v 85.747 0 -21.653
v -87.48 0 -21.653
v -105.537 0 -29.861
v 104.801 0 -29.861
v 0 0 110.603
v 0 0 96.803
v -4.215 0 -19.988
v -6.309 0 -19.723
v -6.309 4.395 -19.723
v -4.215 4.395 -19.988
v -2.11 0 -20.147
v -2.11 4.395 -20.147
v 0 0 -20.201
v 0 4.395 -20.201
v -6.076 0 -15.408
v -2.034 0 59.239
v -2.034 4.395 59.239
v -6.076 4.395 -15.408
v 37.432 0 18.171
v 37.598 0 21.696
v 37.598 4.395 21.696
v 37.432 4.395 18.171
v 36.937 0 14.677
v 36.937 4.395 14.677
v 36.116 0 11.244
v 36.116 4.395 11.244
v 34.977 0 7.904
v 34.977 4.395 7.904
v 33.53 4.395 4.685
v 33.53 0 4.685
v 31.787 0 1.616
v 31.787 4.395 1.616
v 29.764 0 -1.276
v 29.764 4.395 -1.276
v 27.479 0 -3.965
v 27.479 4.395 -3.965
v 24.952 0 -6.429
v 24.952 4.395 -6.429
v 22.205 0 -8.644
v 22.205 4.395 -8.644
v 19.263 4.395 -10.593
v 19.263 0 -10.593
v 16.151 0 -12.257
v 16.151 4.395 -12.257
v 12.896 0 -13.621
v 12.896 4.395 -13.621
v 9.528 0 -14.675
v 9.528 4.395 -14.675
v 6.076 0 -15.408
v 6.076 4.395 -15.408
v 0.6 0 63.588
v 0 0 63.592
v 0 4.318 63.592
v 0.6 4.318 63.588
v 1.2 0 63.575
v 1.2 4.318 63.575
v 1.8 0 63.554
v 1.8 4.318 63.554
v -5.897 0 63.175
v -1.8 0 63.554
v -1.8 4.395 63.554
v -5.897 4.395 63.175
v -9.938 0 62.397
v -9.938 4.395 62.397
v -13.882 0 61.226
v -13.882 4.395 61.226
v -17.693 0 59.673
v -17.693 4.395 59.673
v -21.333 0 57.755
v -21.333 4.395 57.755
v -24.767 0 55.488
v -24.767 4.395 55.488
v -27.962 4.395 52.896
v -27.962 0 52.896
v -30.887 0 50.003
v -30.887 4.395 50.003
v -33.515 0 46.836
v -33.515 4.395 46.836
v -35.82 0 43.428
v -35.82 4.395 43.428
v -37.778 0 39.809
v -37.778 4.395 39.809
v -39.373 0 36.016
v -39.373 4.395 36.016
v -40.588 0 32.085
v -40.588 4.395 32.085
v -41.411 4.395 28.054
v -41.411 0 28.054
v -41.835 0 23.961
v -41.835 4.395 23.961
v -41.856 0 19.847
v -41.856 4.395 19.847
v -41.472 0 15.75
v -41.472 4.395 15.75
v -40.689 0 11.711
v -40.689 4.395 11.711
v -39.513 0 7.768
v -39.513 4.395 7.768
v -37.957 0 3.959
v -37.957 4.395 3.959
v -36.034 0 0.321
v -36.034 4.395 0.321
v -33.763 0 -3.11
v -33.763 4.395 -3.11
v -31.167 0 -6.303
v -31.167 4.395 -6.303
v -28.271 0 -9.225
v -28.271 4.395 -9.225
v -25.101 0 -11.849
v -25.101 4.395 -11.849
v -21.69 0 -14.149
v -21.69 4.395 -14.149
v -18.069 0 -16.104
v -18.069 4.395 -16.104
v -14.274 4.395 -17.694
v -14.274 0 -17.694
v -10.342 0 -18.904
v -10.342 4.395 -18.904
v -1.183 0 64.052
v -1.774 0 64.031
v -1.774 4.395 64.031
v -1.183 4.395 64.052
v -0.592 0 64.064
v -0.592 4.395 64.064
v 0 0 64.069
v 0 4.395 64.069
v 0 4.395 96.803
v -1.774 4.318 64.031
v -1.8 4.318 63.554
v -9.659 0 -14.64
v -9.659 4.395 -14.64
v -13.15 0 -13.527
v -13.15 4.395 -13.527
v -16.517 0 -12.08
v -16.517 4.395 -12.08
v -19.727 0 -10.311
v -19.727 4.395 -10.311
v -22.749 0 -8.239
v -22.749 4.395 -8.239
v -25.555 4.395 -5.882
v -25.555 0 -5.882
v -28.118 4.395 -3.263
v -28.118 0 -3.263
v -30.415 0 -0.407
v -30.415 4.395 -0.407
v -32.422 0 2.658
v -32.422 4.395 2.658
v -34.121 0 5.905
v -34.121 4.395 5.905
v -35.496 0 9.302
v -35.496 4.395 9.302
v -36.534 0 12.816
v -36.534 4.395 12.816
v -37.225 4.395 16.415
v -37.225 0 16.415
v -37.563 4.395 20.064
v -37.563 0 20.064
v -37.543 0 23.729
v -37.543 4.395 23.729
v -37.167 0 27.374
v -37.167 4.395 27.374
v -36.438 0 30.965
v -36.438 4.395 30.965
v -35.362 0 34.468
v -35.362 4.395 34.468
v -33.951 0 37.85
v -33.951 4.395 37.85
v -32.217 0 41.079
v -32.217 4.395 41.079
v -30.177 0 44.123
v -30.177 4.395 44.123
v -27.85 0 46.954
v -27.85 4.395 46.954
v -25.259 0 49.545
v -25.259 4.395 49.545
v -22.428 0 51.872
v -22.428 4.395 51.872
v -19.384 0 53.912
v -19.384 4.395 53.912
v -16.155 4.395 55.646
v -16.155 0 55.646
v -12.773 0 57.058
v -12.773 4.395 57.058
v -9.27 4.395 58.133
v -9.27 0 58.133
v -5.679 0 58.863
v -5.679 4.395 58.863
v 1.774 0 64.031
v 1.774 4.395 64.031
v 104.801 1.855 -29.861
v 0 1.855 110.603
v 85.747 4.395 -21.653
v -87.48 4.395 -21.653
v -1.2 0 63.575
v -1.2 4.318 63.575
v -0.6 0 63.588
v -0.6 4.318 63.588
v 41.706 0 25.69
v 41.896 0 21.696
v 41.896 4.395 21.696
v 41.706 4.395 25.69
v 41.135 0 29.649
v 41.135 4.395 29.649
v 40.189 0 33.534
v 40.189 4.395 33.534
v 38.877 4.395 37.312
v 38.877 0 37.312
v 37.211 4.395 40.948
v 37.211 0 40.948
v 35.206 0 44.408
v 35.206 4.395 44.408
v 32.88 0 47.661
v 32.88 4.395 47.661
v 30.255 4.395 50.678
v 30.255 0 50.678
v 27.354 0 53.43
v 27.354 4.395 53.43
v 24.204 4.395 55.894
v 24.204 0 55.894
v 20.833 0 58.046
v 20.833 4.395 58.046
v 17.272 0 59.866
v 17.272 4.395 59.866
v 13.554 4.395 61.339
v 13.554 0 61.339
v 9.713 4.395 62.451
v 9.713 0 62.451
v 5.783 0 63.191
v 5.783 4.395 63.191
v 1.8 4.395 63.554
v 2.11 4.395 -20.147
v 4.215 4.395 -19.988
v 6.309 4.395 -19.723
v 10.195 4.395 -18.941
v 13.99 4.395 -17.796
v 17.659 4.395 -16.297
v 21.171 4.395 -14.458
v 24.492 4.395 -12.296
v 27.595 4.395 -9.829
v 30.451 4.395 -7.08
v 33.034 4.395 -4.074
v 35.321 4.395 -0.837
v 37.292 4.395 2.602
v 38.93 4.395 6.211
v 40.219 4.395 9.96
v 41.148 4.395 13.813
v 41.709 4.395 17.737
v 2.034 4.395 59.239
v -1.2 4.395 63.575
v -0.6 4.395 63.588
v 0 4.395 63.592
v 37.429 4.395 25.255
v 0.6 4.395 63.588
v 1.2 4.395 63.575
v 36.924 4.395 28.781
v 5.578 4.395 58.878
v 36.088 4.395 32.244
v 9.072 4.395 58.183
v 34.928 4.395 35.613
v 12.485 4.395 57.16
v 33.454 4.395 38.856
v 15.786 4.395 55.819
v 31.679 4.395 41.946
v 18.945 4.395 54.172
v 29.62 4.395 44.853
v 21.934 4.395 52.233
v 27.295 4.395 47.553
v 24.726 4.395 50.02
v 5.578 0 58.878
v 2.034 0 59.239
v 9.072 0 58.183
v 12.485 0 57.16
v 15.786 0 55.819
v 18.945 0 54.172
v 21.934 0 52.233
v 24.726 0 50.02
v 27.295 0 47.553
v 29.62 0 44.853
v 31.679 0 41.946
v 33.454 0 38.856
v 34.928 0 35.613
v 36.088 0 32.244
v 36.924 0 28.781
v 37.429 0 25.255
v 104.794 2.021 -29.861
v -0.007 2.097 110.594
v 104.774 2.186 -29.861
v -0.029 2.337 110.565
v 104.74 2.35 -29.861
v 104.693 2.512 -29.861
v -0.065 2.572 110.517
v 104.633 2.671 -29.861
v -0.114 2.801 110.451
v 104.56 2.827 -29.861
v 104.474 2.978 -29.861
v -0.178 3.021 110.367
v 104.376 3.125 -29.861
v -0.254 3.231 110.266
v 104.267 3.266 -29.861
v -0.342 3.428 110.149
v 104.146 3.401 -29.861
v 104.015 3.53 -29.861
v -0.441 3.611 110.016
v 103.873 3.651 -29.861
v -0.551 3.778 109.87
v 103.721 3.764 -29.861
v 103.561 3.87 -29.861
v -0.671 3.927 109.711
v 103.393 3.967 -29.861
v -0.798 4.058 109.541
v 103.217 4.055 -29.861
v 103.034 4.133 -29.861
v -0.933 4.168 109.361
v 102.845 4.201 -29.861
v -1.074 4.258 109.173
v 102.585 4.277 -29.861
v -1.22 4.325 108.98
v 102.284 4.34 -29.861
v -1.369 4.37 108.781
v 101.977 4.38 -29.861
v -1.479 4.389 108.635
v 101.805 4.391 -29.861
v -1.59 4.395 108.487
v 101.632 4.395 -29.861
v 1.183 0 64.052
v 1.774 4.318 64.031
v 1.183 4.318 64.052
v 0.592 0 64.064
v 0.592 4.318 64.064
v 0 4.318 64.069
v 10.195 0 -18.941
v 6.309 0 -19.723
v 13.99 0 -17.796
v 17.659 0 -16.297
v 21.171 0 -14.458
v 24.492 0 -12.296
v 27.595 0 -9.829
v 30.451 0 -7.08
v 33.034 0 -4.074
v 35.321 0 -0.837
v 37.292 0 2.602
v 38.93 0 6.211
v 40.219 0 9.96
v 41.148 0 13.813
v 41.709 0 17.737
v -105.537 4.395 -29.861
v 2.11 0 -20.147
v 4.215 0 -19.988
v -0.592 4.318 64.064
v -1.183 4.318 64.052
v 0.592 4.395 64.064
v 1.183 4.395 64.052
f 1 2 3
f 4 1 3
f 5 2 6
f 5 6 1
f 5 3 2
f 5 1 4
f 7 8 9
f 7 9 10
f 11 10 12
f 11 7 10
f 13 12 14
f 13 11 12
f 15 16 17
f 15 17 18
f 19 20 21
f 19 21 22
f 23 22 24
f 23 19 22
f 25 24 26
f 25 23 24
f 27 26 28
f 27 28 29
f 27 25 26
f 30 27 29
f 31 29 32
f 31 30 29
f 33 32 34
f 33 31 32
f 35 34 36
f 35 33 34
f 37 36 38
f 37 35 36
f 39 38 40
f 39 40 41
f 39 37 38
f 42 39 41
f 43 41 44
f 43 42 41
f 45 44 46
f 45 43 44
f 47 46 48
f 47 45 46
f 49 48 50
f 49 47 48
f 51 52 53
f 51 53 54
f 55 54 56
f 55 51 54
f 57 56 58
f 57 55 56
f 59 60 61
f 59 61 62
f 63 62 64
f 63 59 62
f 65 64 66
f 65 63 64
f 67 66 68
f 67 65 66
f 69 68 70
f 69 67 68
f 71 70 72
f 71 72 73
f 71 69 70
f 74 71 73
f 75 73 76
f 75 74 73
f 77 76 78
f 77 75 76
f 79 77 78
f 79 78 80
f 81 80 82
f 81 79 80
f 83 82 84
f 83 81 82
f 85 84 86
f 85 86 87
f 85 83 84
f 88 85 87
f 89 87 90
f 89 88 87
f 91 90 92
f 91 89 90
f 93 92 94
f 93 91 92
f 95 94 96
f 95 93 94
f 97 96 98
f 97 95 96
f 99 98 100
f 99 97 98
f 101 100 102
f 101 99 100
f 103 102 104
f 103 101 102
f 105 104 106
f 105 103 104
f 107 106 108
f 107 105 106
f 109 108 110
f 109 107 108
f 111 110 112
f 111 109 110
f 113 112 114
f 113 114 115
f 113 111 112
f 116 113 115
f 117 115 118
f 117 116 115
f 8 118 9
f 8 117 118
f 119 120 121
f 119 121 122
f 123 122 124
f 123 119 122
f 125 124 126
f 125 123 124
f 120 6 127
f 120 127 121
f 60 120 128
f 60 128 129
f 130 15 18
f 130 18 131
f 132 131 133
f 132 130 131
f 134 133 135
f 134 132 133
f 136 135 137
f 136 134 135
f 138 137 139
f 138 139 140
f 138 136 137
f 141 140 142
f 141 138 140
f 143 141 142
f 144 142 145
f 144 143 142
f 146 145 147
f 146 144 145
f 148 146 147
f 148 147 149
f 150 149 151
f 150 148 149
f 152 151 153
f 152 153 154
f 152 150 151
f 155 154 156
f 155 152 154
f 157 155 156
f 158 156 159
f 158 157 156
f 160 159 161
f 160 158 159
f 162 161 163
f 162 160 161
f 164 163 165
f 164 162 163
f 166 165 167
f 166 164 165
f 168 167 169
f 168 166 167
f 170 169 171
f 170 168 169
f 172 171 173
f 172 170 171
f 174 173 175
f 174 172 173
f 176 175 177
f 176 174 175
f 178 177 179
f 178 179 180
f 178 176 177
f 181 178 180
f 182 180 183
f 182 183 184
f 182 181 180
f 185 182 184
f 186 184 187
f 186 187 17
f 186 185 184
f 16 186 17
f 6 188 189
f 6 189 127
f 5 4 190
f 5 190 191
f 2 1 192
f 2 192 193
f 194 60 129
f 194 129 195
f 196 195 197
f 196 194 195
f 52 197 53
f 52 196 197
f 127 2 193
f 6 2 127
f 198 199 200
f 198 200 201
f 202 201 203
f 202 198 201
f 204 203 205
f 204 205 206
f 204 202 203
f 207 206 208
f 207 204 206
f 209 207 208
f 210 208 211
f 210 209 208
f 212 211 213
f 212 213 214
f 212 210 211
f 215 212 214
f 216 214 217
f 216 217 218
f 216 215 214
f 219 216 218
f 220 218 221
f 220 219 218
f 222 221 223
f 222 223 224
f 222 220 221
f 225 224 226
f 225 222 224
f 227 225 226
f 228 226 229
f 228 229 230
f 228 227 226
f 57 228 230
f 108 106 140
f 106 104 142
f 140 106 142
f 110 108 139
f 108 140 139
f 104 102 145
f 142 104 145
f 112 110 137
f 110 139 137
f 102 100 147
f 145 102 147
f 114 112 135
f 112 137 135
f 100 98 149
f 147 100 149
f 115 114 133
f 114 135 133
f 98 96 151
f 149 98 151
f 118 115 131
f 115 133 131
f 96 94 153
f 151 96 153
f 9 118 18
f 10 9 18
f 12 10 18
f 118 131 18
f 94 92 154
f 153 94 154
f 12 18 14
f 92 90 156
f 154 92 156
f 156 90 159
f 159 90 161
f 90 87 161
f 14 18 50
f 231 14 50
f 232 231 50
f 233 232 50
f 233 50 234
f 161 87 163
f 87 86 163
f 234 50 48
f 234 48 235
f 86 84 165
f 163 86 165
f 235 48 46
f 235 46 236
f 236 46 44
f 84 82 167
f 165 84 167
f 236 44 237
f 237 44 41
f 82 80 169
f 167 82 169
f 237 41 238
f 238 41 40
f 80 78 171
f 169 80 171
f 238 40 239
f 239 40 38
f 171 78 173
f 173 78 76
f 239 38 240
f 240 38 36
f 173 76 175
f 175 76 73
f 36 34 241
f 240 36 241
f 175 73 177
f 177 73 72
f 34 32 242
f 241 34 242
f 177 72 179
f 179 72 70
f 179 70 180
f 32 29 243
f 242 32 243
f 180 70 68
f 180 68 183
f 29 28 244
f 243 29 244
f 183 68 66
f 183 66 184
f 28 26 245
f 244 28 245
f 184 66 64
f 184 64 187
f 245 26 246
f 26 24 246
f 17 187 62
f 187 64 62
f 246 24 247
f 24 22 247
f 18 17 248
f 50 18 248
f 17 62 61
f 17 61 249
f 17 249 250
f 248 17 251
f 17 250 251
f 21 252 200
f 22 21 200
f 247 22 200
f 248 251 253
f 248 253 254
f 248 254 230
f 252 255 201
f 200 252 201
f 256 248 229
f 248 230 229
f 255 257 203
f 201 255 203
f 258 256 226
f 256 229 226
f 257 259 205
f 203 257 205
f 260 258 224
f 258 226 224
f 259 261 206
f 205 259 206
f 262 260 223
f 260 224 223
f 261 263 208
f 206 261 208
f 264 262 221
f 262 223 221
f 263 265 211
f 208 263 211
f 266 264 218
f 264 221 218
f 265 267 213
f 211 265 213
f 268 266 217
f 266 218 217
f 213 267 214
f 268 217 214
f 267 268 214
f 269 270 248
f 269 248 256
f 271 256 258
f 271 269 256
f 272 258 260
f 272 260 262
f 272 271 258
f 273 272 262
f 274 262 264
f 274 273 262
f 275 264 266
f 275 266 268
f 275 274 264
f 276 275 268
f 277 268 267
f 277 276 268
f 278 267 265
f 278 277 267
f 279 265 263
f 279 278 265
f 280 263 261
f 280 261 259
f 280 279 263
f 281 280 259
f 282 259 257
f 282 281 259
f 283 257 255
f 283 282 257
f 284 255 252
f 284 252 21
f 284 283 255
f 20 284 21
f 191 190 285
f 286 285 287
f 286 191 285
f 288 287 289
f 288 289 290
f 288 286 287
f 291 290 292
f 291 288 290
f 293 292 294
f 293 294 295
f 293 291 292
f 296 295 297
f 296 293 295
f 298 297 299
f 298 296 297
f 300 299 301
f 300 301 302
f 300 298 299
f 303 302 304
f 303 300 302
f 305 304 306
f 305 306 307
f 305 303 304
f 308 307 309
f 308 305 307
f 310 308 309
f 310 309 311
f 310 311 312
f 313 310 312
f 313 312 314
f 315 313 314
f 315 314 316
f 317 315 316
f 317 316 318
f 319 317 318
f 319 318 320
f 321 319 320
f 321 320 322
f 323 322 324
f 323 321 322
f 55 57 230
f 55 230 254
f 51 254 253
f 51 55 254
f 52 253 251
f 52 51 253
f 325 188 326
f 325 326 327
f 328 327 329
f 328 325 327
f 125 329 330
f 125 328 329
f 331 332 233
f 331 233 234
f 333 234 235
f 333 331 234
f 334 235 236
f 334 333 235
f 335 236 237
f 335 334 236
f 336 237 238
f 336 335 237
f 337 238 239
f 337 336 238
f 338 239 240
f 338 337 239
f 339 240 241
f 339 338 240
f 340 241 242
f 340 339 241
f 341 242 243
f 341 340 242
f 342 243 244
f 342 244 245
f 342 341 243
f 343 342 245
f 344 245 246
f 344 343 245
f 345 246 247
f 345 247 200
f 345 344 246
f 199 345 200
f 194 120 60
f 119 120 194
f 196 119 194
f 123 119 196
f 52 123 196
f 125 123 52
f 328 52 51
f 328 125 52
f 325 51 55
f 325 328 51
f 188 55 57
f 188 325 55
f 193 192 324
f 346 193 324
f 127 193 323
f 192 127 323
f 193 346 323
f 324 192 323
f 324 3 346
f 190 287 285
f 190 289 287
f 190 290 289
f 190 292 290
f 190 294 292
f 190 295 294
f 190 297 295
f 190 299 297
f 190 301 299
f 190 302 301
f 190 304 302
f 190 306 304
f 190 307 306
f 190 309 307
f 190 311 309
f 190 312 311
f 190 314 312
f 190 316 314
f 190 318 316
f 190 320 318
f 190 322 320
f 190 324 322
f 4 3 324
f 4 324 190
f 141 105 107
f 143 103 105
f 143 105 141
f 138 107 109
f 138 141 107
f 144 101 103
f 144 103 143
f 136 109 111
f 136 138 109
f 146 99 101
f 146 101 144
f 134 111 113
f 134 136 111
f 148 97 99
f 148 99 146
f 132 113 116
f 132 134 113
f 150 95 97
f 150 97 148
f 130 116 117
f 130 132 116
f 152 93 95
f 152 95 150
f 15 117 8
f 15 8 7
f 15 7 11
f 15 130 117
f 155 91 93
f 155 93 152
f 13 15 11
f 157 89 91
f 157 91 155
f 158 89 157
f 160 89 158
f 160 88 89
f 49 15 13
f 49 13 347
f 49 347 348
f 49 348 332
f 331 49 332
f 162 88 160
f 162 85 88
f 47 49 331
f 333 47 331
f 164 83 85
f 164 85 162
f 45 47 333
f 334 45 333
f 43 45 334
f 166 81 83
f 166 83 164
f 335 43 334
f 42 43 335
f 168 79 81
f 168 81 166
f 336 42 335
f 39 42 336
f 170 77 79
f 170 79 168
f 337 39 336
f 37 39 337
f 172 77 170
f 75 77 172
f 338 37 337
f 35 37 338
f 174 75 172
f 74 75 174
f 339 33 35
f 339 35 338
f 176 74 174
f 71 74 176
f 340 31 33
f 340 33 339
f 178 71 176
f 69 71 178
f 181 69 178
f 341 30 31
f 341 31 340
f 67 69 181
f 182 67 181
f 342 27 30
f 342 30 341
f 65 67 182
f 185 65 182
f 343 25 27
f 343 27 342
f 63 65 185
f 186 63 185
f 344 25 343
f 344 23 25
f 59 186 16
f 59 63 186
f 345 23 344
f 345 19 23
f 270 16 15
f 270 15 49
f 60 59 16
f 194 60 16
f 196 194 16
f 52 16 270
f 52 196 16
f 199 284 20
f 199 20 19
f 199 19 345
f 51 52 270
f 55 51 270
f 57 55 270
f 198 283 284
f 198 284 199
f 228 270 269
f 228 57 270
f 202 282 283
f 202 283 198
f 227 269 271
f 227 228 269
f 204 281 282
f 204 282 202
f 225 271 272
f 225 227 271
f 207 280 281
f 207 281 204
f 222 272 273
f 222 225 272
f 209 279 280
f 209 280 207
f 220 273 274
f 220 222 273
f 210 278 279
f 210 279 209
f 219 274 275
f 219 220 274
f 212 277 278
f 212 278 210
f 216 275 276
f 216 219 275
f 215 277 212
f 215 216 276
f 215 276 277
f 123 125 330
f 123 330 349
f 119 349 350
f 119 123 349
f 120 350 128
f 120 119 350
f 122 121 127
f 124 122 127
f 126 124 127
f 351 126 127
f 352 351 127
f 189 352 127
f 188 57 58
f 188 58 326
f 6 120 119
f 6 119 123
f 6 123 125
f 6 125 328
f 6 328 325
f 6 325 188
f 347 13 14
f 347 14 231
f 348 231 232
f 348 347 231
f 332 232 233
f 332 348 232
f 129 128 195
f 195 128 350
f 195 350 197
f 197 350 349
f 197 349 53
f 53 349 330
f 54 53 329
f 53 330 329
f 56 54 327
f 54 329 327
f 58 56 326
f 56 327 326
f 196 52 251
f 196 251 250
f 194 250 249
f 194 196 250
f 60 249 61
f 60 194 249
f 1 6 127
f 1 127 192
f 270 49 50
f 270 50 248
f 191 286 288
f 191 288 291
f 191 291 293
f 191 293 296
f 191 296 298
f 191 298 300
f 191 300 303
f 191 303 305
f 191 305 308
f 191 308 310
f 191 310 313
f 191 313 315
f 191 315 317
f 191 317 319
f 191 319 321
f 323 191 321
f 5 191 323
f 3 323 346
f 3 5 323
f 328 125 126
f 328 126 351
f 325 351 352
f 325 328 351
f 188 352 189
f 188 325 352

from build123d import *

# Parameters (mm, degrees)
F1_DEPTH = 4.3948143721
F2_R     = 2.54
F3_DEPTH = 4.318


with BuildPart() as f1:
    # F0 (on Front) → F1 (new body)
    with BuildSketch(Plane.XZ):
        with BuildLine():
            ThreePointArc((41.8964295767, 21.6959267855), (30.2550519176, 50.6776907887), (1.8002851927, 63.5536594582))
            Line((1.8002851927, 63.5536594582), (2.033911075, 59.2389039918))
            ThreePointArc((2.033911075, 59.2389039918), (27.2954481859, 47.5526558924), (37.5980309561, 21.6959267855))
            ThreePointArc((37.5980309561, 21.6959267855), (28.653509469, -2.6472103765), (6.0757245047, -15.4079477227))
            Line((6.0757245047, -15.4079477227), (6.3093503869, -19.7227031891))
            ThreePointArc((6.3093503869, -19.7227031891), (31.7777442988, -5.607658667), (41.8964295767, 21.6959267855))
        make_face()
        with BuildLine():
            Line((-2.033911075, 59.2389039918), (-1.8002851927, 63.5536594582))
            ThreePointArc((-1.8002851927, 63.5536594582), (-41.8351489928, 23.9611243544), (-6.3093503869, -19.7227031891))
            Line((-6.3093503869, -19.7227031891), (-6.0757245047, -15.4079477227))
            ThreePointArc((-6.0757245047, -15.4079477227), (-37.5430375041, 23.7287245484), (-2.033911075, 59.2389039918))
        make_face()
        with BuildLine():
            Line((0, -15.9021041707), (0, -20.2005027912))
            ThreePointArc((0, -20.2005027912), (3.1637080604, -20.0808821231), (6.3093503869, -19.7227031891))
            Line((6.3093503869, -19.7227031891), (6.0757245047, -15.4079477227))
            ThreePointArc((6.0757245047, -15.4079477227), (3.0478934878, -15.7783614275), (0, -15.9021041707))
        make_face()
        with BuildLine():
            Line((-6.0757245047, -15.4079477227), (-6.3093503869, -19.7227031891))
            ThreePointArc((-6.3093503869, -19.7227031891), (-3.1637080604, -20.0808821231), (0, -20.2005027912))
            Line((0, -20.2005027912), (0, -15.9021041707))
            ThreePointArc((0, -15.9021041707), (-3.0478934878, -15.7783614275), (-6.0757245047, -15.4079477227))
        make_face()
        with BuildLine():
            ThreePointArc((2.033911075, 59.2389039918), (1.017328017, 59.2801917841), (0, 59.2939577416))
            Line((0, 59.2939577416), (0, -15.9021041707))
            ThreePointArc((0, -15.9021041707), (3.0478934878, -15.7783614275), (6.0757245047, -15.4079477227))
            Line((6.0757245047, -15.4079477227), (2.033911075, 59.2389039918))
        make_face()
        with BuildLine():
            Line((0, -15.9021041707), (0, 59.2939577416))
            ThreePointArc((0, 59.2939577416), (-1.017328017, 59.2801917841), (-2.033911075, 59.2389039918))
            Line((-2.033911075, 59.2389039918), (-6.0757245047, -15.4079477227))
            ThreePointArc((-6.0757245047, -15.4079477227), (-3.0478934878, -15.7783614275), (0, -15.9021041707))
        make_face()
        with BuildLine():
            ThreePointArc((1.8002851927, 63.5536594582), (0.9003505186, 63.582681019), (0, 63.5923563622))
            Line((0, 63.5923563622), (0, 59.2939577416))
            ThreePointArc((0, 59.2939577416), (1.017328017, 59.2801917841), (2.033911075, 59.2389039918))
            Line((2.033911075, 59.2389039918), (1.8002851927, 63.5536594582))
        make_face()
        with BuildLine():
            Line((0, 59.2939577416), (0, 63.5923563622))
            ThreePointArc((0, 63.5923563622), (-0.9003505186, 63.582681019), (-1.8002851927, 63.5536594582))
            Line((-1.8002851927, 63.5536594582), (-2.033911075, 59.2389039918))
            ThreePointArc((-2.033911075, 59.2389039918), (-1.017328017, 59.2801917841), (0, 59.2939577416))
        make_face()
    extrude(amount=-F1_DEPTH)


with BuildPart() as f1b:
    # F0 (on Front) → F1, piece 2 (new body)
    with BuildSketch(Plane.XZ):
        Polygon((104.8010513186, -29.8607349396), (0, 110.6034815311), (-105.5374293366, -29.8607349396), align=None)
        Polygon((-87.4795168638, -21.6533243656), (0, 96.8025028706), (85.7472121716, -21.6533243656), align=None, mode=Mode.SUBTRACT)
    extrude(amount=-F1_DEPTH)

    # F2
    f2_edges = [f1b.edges().sort_by_distance(p)[0] for p in [
        (52.400526, 4.394814, 40.371373),
    ]]
    fillet(f2_edges, radius=F2_R)


with BuildPart() as f1c:
    # F0 (on Front) → F1, piece 3 (new body)
    with BuildSketch(Plane.XZ):
        with BuildLine():
            Line((1.7744143515, 64.0314590603), (0, 96.8025028706))
            Line((0, 96.8025028706), (0, 64.0686283666))
            ThreePointArc((0, 64.0686283666), (0.8874018042, 64.0593350209), (1.7744143515, 64.0314590603))
        make_face()
        with BuildLine():
            Line((0, 64.0686283666), (0, 96.8025028706))
            Line((0, 96.8025028706), (-1.7744143515, 64.0314590603))
            ThreePointArc((-1.7744143515, 64.0314590603), (-0.8874018042, 64.0593350209), (0, 64.0686283666))
        make_face()
    extrude(amount=-F1_DEPTH)


with BuildPart() as f3:
    # F0 (on Front) → F3 (new body)
    with BuildSketch(Plane.XZ):
        with BuildLine():
            Line((0, 63.5923563622), (0, 64.0686283666))
            ThreePointArc((0, 64.0686283666), (-0.8874018042, 64.0593350209), (-1.7744143515, 64.0314590603))
            Line((-1.7744143515, 64.0314590603), (-1.8002851927, 63.5536594582))
            ThreePointArc((-1.8002851927, 63.5536594582), (-0.9003505186, 63.582681019), (0, 63.5923563622))
        make_face()
        with BuildLine():
            ThreePointArc((1.7744143515, 64.0314590603), (0.8874018042, 64.0593350209), (0, 64.0686283666))
            Line((0, 64.0686283666), (0, 63.5923563622))
            ThreePointArc((0, 63.5923563622), (0.9003505186, 63.582681019), (1.8002851927, 63.5536594582))
            Line((1.8002851927, 63.5536594582), (1.7744143515, 64.0314590603))
        make_face()
    extrude(amount=-F3_DEPTH)


solid = Compound([f1.part, f1b.part, f1c.part, f3.part])
